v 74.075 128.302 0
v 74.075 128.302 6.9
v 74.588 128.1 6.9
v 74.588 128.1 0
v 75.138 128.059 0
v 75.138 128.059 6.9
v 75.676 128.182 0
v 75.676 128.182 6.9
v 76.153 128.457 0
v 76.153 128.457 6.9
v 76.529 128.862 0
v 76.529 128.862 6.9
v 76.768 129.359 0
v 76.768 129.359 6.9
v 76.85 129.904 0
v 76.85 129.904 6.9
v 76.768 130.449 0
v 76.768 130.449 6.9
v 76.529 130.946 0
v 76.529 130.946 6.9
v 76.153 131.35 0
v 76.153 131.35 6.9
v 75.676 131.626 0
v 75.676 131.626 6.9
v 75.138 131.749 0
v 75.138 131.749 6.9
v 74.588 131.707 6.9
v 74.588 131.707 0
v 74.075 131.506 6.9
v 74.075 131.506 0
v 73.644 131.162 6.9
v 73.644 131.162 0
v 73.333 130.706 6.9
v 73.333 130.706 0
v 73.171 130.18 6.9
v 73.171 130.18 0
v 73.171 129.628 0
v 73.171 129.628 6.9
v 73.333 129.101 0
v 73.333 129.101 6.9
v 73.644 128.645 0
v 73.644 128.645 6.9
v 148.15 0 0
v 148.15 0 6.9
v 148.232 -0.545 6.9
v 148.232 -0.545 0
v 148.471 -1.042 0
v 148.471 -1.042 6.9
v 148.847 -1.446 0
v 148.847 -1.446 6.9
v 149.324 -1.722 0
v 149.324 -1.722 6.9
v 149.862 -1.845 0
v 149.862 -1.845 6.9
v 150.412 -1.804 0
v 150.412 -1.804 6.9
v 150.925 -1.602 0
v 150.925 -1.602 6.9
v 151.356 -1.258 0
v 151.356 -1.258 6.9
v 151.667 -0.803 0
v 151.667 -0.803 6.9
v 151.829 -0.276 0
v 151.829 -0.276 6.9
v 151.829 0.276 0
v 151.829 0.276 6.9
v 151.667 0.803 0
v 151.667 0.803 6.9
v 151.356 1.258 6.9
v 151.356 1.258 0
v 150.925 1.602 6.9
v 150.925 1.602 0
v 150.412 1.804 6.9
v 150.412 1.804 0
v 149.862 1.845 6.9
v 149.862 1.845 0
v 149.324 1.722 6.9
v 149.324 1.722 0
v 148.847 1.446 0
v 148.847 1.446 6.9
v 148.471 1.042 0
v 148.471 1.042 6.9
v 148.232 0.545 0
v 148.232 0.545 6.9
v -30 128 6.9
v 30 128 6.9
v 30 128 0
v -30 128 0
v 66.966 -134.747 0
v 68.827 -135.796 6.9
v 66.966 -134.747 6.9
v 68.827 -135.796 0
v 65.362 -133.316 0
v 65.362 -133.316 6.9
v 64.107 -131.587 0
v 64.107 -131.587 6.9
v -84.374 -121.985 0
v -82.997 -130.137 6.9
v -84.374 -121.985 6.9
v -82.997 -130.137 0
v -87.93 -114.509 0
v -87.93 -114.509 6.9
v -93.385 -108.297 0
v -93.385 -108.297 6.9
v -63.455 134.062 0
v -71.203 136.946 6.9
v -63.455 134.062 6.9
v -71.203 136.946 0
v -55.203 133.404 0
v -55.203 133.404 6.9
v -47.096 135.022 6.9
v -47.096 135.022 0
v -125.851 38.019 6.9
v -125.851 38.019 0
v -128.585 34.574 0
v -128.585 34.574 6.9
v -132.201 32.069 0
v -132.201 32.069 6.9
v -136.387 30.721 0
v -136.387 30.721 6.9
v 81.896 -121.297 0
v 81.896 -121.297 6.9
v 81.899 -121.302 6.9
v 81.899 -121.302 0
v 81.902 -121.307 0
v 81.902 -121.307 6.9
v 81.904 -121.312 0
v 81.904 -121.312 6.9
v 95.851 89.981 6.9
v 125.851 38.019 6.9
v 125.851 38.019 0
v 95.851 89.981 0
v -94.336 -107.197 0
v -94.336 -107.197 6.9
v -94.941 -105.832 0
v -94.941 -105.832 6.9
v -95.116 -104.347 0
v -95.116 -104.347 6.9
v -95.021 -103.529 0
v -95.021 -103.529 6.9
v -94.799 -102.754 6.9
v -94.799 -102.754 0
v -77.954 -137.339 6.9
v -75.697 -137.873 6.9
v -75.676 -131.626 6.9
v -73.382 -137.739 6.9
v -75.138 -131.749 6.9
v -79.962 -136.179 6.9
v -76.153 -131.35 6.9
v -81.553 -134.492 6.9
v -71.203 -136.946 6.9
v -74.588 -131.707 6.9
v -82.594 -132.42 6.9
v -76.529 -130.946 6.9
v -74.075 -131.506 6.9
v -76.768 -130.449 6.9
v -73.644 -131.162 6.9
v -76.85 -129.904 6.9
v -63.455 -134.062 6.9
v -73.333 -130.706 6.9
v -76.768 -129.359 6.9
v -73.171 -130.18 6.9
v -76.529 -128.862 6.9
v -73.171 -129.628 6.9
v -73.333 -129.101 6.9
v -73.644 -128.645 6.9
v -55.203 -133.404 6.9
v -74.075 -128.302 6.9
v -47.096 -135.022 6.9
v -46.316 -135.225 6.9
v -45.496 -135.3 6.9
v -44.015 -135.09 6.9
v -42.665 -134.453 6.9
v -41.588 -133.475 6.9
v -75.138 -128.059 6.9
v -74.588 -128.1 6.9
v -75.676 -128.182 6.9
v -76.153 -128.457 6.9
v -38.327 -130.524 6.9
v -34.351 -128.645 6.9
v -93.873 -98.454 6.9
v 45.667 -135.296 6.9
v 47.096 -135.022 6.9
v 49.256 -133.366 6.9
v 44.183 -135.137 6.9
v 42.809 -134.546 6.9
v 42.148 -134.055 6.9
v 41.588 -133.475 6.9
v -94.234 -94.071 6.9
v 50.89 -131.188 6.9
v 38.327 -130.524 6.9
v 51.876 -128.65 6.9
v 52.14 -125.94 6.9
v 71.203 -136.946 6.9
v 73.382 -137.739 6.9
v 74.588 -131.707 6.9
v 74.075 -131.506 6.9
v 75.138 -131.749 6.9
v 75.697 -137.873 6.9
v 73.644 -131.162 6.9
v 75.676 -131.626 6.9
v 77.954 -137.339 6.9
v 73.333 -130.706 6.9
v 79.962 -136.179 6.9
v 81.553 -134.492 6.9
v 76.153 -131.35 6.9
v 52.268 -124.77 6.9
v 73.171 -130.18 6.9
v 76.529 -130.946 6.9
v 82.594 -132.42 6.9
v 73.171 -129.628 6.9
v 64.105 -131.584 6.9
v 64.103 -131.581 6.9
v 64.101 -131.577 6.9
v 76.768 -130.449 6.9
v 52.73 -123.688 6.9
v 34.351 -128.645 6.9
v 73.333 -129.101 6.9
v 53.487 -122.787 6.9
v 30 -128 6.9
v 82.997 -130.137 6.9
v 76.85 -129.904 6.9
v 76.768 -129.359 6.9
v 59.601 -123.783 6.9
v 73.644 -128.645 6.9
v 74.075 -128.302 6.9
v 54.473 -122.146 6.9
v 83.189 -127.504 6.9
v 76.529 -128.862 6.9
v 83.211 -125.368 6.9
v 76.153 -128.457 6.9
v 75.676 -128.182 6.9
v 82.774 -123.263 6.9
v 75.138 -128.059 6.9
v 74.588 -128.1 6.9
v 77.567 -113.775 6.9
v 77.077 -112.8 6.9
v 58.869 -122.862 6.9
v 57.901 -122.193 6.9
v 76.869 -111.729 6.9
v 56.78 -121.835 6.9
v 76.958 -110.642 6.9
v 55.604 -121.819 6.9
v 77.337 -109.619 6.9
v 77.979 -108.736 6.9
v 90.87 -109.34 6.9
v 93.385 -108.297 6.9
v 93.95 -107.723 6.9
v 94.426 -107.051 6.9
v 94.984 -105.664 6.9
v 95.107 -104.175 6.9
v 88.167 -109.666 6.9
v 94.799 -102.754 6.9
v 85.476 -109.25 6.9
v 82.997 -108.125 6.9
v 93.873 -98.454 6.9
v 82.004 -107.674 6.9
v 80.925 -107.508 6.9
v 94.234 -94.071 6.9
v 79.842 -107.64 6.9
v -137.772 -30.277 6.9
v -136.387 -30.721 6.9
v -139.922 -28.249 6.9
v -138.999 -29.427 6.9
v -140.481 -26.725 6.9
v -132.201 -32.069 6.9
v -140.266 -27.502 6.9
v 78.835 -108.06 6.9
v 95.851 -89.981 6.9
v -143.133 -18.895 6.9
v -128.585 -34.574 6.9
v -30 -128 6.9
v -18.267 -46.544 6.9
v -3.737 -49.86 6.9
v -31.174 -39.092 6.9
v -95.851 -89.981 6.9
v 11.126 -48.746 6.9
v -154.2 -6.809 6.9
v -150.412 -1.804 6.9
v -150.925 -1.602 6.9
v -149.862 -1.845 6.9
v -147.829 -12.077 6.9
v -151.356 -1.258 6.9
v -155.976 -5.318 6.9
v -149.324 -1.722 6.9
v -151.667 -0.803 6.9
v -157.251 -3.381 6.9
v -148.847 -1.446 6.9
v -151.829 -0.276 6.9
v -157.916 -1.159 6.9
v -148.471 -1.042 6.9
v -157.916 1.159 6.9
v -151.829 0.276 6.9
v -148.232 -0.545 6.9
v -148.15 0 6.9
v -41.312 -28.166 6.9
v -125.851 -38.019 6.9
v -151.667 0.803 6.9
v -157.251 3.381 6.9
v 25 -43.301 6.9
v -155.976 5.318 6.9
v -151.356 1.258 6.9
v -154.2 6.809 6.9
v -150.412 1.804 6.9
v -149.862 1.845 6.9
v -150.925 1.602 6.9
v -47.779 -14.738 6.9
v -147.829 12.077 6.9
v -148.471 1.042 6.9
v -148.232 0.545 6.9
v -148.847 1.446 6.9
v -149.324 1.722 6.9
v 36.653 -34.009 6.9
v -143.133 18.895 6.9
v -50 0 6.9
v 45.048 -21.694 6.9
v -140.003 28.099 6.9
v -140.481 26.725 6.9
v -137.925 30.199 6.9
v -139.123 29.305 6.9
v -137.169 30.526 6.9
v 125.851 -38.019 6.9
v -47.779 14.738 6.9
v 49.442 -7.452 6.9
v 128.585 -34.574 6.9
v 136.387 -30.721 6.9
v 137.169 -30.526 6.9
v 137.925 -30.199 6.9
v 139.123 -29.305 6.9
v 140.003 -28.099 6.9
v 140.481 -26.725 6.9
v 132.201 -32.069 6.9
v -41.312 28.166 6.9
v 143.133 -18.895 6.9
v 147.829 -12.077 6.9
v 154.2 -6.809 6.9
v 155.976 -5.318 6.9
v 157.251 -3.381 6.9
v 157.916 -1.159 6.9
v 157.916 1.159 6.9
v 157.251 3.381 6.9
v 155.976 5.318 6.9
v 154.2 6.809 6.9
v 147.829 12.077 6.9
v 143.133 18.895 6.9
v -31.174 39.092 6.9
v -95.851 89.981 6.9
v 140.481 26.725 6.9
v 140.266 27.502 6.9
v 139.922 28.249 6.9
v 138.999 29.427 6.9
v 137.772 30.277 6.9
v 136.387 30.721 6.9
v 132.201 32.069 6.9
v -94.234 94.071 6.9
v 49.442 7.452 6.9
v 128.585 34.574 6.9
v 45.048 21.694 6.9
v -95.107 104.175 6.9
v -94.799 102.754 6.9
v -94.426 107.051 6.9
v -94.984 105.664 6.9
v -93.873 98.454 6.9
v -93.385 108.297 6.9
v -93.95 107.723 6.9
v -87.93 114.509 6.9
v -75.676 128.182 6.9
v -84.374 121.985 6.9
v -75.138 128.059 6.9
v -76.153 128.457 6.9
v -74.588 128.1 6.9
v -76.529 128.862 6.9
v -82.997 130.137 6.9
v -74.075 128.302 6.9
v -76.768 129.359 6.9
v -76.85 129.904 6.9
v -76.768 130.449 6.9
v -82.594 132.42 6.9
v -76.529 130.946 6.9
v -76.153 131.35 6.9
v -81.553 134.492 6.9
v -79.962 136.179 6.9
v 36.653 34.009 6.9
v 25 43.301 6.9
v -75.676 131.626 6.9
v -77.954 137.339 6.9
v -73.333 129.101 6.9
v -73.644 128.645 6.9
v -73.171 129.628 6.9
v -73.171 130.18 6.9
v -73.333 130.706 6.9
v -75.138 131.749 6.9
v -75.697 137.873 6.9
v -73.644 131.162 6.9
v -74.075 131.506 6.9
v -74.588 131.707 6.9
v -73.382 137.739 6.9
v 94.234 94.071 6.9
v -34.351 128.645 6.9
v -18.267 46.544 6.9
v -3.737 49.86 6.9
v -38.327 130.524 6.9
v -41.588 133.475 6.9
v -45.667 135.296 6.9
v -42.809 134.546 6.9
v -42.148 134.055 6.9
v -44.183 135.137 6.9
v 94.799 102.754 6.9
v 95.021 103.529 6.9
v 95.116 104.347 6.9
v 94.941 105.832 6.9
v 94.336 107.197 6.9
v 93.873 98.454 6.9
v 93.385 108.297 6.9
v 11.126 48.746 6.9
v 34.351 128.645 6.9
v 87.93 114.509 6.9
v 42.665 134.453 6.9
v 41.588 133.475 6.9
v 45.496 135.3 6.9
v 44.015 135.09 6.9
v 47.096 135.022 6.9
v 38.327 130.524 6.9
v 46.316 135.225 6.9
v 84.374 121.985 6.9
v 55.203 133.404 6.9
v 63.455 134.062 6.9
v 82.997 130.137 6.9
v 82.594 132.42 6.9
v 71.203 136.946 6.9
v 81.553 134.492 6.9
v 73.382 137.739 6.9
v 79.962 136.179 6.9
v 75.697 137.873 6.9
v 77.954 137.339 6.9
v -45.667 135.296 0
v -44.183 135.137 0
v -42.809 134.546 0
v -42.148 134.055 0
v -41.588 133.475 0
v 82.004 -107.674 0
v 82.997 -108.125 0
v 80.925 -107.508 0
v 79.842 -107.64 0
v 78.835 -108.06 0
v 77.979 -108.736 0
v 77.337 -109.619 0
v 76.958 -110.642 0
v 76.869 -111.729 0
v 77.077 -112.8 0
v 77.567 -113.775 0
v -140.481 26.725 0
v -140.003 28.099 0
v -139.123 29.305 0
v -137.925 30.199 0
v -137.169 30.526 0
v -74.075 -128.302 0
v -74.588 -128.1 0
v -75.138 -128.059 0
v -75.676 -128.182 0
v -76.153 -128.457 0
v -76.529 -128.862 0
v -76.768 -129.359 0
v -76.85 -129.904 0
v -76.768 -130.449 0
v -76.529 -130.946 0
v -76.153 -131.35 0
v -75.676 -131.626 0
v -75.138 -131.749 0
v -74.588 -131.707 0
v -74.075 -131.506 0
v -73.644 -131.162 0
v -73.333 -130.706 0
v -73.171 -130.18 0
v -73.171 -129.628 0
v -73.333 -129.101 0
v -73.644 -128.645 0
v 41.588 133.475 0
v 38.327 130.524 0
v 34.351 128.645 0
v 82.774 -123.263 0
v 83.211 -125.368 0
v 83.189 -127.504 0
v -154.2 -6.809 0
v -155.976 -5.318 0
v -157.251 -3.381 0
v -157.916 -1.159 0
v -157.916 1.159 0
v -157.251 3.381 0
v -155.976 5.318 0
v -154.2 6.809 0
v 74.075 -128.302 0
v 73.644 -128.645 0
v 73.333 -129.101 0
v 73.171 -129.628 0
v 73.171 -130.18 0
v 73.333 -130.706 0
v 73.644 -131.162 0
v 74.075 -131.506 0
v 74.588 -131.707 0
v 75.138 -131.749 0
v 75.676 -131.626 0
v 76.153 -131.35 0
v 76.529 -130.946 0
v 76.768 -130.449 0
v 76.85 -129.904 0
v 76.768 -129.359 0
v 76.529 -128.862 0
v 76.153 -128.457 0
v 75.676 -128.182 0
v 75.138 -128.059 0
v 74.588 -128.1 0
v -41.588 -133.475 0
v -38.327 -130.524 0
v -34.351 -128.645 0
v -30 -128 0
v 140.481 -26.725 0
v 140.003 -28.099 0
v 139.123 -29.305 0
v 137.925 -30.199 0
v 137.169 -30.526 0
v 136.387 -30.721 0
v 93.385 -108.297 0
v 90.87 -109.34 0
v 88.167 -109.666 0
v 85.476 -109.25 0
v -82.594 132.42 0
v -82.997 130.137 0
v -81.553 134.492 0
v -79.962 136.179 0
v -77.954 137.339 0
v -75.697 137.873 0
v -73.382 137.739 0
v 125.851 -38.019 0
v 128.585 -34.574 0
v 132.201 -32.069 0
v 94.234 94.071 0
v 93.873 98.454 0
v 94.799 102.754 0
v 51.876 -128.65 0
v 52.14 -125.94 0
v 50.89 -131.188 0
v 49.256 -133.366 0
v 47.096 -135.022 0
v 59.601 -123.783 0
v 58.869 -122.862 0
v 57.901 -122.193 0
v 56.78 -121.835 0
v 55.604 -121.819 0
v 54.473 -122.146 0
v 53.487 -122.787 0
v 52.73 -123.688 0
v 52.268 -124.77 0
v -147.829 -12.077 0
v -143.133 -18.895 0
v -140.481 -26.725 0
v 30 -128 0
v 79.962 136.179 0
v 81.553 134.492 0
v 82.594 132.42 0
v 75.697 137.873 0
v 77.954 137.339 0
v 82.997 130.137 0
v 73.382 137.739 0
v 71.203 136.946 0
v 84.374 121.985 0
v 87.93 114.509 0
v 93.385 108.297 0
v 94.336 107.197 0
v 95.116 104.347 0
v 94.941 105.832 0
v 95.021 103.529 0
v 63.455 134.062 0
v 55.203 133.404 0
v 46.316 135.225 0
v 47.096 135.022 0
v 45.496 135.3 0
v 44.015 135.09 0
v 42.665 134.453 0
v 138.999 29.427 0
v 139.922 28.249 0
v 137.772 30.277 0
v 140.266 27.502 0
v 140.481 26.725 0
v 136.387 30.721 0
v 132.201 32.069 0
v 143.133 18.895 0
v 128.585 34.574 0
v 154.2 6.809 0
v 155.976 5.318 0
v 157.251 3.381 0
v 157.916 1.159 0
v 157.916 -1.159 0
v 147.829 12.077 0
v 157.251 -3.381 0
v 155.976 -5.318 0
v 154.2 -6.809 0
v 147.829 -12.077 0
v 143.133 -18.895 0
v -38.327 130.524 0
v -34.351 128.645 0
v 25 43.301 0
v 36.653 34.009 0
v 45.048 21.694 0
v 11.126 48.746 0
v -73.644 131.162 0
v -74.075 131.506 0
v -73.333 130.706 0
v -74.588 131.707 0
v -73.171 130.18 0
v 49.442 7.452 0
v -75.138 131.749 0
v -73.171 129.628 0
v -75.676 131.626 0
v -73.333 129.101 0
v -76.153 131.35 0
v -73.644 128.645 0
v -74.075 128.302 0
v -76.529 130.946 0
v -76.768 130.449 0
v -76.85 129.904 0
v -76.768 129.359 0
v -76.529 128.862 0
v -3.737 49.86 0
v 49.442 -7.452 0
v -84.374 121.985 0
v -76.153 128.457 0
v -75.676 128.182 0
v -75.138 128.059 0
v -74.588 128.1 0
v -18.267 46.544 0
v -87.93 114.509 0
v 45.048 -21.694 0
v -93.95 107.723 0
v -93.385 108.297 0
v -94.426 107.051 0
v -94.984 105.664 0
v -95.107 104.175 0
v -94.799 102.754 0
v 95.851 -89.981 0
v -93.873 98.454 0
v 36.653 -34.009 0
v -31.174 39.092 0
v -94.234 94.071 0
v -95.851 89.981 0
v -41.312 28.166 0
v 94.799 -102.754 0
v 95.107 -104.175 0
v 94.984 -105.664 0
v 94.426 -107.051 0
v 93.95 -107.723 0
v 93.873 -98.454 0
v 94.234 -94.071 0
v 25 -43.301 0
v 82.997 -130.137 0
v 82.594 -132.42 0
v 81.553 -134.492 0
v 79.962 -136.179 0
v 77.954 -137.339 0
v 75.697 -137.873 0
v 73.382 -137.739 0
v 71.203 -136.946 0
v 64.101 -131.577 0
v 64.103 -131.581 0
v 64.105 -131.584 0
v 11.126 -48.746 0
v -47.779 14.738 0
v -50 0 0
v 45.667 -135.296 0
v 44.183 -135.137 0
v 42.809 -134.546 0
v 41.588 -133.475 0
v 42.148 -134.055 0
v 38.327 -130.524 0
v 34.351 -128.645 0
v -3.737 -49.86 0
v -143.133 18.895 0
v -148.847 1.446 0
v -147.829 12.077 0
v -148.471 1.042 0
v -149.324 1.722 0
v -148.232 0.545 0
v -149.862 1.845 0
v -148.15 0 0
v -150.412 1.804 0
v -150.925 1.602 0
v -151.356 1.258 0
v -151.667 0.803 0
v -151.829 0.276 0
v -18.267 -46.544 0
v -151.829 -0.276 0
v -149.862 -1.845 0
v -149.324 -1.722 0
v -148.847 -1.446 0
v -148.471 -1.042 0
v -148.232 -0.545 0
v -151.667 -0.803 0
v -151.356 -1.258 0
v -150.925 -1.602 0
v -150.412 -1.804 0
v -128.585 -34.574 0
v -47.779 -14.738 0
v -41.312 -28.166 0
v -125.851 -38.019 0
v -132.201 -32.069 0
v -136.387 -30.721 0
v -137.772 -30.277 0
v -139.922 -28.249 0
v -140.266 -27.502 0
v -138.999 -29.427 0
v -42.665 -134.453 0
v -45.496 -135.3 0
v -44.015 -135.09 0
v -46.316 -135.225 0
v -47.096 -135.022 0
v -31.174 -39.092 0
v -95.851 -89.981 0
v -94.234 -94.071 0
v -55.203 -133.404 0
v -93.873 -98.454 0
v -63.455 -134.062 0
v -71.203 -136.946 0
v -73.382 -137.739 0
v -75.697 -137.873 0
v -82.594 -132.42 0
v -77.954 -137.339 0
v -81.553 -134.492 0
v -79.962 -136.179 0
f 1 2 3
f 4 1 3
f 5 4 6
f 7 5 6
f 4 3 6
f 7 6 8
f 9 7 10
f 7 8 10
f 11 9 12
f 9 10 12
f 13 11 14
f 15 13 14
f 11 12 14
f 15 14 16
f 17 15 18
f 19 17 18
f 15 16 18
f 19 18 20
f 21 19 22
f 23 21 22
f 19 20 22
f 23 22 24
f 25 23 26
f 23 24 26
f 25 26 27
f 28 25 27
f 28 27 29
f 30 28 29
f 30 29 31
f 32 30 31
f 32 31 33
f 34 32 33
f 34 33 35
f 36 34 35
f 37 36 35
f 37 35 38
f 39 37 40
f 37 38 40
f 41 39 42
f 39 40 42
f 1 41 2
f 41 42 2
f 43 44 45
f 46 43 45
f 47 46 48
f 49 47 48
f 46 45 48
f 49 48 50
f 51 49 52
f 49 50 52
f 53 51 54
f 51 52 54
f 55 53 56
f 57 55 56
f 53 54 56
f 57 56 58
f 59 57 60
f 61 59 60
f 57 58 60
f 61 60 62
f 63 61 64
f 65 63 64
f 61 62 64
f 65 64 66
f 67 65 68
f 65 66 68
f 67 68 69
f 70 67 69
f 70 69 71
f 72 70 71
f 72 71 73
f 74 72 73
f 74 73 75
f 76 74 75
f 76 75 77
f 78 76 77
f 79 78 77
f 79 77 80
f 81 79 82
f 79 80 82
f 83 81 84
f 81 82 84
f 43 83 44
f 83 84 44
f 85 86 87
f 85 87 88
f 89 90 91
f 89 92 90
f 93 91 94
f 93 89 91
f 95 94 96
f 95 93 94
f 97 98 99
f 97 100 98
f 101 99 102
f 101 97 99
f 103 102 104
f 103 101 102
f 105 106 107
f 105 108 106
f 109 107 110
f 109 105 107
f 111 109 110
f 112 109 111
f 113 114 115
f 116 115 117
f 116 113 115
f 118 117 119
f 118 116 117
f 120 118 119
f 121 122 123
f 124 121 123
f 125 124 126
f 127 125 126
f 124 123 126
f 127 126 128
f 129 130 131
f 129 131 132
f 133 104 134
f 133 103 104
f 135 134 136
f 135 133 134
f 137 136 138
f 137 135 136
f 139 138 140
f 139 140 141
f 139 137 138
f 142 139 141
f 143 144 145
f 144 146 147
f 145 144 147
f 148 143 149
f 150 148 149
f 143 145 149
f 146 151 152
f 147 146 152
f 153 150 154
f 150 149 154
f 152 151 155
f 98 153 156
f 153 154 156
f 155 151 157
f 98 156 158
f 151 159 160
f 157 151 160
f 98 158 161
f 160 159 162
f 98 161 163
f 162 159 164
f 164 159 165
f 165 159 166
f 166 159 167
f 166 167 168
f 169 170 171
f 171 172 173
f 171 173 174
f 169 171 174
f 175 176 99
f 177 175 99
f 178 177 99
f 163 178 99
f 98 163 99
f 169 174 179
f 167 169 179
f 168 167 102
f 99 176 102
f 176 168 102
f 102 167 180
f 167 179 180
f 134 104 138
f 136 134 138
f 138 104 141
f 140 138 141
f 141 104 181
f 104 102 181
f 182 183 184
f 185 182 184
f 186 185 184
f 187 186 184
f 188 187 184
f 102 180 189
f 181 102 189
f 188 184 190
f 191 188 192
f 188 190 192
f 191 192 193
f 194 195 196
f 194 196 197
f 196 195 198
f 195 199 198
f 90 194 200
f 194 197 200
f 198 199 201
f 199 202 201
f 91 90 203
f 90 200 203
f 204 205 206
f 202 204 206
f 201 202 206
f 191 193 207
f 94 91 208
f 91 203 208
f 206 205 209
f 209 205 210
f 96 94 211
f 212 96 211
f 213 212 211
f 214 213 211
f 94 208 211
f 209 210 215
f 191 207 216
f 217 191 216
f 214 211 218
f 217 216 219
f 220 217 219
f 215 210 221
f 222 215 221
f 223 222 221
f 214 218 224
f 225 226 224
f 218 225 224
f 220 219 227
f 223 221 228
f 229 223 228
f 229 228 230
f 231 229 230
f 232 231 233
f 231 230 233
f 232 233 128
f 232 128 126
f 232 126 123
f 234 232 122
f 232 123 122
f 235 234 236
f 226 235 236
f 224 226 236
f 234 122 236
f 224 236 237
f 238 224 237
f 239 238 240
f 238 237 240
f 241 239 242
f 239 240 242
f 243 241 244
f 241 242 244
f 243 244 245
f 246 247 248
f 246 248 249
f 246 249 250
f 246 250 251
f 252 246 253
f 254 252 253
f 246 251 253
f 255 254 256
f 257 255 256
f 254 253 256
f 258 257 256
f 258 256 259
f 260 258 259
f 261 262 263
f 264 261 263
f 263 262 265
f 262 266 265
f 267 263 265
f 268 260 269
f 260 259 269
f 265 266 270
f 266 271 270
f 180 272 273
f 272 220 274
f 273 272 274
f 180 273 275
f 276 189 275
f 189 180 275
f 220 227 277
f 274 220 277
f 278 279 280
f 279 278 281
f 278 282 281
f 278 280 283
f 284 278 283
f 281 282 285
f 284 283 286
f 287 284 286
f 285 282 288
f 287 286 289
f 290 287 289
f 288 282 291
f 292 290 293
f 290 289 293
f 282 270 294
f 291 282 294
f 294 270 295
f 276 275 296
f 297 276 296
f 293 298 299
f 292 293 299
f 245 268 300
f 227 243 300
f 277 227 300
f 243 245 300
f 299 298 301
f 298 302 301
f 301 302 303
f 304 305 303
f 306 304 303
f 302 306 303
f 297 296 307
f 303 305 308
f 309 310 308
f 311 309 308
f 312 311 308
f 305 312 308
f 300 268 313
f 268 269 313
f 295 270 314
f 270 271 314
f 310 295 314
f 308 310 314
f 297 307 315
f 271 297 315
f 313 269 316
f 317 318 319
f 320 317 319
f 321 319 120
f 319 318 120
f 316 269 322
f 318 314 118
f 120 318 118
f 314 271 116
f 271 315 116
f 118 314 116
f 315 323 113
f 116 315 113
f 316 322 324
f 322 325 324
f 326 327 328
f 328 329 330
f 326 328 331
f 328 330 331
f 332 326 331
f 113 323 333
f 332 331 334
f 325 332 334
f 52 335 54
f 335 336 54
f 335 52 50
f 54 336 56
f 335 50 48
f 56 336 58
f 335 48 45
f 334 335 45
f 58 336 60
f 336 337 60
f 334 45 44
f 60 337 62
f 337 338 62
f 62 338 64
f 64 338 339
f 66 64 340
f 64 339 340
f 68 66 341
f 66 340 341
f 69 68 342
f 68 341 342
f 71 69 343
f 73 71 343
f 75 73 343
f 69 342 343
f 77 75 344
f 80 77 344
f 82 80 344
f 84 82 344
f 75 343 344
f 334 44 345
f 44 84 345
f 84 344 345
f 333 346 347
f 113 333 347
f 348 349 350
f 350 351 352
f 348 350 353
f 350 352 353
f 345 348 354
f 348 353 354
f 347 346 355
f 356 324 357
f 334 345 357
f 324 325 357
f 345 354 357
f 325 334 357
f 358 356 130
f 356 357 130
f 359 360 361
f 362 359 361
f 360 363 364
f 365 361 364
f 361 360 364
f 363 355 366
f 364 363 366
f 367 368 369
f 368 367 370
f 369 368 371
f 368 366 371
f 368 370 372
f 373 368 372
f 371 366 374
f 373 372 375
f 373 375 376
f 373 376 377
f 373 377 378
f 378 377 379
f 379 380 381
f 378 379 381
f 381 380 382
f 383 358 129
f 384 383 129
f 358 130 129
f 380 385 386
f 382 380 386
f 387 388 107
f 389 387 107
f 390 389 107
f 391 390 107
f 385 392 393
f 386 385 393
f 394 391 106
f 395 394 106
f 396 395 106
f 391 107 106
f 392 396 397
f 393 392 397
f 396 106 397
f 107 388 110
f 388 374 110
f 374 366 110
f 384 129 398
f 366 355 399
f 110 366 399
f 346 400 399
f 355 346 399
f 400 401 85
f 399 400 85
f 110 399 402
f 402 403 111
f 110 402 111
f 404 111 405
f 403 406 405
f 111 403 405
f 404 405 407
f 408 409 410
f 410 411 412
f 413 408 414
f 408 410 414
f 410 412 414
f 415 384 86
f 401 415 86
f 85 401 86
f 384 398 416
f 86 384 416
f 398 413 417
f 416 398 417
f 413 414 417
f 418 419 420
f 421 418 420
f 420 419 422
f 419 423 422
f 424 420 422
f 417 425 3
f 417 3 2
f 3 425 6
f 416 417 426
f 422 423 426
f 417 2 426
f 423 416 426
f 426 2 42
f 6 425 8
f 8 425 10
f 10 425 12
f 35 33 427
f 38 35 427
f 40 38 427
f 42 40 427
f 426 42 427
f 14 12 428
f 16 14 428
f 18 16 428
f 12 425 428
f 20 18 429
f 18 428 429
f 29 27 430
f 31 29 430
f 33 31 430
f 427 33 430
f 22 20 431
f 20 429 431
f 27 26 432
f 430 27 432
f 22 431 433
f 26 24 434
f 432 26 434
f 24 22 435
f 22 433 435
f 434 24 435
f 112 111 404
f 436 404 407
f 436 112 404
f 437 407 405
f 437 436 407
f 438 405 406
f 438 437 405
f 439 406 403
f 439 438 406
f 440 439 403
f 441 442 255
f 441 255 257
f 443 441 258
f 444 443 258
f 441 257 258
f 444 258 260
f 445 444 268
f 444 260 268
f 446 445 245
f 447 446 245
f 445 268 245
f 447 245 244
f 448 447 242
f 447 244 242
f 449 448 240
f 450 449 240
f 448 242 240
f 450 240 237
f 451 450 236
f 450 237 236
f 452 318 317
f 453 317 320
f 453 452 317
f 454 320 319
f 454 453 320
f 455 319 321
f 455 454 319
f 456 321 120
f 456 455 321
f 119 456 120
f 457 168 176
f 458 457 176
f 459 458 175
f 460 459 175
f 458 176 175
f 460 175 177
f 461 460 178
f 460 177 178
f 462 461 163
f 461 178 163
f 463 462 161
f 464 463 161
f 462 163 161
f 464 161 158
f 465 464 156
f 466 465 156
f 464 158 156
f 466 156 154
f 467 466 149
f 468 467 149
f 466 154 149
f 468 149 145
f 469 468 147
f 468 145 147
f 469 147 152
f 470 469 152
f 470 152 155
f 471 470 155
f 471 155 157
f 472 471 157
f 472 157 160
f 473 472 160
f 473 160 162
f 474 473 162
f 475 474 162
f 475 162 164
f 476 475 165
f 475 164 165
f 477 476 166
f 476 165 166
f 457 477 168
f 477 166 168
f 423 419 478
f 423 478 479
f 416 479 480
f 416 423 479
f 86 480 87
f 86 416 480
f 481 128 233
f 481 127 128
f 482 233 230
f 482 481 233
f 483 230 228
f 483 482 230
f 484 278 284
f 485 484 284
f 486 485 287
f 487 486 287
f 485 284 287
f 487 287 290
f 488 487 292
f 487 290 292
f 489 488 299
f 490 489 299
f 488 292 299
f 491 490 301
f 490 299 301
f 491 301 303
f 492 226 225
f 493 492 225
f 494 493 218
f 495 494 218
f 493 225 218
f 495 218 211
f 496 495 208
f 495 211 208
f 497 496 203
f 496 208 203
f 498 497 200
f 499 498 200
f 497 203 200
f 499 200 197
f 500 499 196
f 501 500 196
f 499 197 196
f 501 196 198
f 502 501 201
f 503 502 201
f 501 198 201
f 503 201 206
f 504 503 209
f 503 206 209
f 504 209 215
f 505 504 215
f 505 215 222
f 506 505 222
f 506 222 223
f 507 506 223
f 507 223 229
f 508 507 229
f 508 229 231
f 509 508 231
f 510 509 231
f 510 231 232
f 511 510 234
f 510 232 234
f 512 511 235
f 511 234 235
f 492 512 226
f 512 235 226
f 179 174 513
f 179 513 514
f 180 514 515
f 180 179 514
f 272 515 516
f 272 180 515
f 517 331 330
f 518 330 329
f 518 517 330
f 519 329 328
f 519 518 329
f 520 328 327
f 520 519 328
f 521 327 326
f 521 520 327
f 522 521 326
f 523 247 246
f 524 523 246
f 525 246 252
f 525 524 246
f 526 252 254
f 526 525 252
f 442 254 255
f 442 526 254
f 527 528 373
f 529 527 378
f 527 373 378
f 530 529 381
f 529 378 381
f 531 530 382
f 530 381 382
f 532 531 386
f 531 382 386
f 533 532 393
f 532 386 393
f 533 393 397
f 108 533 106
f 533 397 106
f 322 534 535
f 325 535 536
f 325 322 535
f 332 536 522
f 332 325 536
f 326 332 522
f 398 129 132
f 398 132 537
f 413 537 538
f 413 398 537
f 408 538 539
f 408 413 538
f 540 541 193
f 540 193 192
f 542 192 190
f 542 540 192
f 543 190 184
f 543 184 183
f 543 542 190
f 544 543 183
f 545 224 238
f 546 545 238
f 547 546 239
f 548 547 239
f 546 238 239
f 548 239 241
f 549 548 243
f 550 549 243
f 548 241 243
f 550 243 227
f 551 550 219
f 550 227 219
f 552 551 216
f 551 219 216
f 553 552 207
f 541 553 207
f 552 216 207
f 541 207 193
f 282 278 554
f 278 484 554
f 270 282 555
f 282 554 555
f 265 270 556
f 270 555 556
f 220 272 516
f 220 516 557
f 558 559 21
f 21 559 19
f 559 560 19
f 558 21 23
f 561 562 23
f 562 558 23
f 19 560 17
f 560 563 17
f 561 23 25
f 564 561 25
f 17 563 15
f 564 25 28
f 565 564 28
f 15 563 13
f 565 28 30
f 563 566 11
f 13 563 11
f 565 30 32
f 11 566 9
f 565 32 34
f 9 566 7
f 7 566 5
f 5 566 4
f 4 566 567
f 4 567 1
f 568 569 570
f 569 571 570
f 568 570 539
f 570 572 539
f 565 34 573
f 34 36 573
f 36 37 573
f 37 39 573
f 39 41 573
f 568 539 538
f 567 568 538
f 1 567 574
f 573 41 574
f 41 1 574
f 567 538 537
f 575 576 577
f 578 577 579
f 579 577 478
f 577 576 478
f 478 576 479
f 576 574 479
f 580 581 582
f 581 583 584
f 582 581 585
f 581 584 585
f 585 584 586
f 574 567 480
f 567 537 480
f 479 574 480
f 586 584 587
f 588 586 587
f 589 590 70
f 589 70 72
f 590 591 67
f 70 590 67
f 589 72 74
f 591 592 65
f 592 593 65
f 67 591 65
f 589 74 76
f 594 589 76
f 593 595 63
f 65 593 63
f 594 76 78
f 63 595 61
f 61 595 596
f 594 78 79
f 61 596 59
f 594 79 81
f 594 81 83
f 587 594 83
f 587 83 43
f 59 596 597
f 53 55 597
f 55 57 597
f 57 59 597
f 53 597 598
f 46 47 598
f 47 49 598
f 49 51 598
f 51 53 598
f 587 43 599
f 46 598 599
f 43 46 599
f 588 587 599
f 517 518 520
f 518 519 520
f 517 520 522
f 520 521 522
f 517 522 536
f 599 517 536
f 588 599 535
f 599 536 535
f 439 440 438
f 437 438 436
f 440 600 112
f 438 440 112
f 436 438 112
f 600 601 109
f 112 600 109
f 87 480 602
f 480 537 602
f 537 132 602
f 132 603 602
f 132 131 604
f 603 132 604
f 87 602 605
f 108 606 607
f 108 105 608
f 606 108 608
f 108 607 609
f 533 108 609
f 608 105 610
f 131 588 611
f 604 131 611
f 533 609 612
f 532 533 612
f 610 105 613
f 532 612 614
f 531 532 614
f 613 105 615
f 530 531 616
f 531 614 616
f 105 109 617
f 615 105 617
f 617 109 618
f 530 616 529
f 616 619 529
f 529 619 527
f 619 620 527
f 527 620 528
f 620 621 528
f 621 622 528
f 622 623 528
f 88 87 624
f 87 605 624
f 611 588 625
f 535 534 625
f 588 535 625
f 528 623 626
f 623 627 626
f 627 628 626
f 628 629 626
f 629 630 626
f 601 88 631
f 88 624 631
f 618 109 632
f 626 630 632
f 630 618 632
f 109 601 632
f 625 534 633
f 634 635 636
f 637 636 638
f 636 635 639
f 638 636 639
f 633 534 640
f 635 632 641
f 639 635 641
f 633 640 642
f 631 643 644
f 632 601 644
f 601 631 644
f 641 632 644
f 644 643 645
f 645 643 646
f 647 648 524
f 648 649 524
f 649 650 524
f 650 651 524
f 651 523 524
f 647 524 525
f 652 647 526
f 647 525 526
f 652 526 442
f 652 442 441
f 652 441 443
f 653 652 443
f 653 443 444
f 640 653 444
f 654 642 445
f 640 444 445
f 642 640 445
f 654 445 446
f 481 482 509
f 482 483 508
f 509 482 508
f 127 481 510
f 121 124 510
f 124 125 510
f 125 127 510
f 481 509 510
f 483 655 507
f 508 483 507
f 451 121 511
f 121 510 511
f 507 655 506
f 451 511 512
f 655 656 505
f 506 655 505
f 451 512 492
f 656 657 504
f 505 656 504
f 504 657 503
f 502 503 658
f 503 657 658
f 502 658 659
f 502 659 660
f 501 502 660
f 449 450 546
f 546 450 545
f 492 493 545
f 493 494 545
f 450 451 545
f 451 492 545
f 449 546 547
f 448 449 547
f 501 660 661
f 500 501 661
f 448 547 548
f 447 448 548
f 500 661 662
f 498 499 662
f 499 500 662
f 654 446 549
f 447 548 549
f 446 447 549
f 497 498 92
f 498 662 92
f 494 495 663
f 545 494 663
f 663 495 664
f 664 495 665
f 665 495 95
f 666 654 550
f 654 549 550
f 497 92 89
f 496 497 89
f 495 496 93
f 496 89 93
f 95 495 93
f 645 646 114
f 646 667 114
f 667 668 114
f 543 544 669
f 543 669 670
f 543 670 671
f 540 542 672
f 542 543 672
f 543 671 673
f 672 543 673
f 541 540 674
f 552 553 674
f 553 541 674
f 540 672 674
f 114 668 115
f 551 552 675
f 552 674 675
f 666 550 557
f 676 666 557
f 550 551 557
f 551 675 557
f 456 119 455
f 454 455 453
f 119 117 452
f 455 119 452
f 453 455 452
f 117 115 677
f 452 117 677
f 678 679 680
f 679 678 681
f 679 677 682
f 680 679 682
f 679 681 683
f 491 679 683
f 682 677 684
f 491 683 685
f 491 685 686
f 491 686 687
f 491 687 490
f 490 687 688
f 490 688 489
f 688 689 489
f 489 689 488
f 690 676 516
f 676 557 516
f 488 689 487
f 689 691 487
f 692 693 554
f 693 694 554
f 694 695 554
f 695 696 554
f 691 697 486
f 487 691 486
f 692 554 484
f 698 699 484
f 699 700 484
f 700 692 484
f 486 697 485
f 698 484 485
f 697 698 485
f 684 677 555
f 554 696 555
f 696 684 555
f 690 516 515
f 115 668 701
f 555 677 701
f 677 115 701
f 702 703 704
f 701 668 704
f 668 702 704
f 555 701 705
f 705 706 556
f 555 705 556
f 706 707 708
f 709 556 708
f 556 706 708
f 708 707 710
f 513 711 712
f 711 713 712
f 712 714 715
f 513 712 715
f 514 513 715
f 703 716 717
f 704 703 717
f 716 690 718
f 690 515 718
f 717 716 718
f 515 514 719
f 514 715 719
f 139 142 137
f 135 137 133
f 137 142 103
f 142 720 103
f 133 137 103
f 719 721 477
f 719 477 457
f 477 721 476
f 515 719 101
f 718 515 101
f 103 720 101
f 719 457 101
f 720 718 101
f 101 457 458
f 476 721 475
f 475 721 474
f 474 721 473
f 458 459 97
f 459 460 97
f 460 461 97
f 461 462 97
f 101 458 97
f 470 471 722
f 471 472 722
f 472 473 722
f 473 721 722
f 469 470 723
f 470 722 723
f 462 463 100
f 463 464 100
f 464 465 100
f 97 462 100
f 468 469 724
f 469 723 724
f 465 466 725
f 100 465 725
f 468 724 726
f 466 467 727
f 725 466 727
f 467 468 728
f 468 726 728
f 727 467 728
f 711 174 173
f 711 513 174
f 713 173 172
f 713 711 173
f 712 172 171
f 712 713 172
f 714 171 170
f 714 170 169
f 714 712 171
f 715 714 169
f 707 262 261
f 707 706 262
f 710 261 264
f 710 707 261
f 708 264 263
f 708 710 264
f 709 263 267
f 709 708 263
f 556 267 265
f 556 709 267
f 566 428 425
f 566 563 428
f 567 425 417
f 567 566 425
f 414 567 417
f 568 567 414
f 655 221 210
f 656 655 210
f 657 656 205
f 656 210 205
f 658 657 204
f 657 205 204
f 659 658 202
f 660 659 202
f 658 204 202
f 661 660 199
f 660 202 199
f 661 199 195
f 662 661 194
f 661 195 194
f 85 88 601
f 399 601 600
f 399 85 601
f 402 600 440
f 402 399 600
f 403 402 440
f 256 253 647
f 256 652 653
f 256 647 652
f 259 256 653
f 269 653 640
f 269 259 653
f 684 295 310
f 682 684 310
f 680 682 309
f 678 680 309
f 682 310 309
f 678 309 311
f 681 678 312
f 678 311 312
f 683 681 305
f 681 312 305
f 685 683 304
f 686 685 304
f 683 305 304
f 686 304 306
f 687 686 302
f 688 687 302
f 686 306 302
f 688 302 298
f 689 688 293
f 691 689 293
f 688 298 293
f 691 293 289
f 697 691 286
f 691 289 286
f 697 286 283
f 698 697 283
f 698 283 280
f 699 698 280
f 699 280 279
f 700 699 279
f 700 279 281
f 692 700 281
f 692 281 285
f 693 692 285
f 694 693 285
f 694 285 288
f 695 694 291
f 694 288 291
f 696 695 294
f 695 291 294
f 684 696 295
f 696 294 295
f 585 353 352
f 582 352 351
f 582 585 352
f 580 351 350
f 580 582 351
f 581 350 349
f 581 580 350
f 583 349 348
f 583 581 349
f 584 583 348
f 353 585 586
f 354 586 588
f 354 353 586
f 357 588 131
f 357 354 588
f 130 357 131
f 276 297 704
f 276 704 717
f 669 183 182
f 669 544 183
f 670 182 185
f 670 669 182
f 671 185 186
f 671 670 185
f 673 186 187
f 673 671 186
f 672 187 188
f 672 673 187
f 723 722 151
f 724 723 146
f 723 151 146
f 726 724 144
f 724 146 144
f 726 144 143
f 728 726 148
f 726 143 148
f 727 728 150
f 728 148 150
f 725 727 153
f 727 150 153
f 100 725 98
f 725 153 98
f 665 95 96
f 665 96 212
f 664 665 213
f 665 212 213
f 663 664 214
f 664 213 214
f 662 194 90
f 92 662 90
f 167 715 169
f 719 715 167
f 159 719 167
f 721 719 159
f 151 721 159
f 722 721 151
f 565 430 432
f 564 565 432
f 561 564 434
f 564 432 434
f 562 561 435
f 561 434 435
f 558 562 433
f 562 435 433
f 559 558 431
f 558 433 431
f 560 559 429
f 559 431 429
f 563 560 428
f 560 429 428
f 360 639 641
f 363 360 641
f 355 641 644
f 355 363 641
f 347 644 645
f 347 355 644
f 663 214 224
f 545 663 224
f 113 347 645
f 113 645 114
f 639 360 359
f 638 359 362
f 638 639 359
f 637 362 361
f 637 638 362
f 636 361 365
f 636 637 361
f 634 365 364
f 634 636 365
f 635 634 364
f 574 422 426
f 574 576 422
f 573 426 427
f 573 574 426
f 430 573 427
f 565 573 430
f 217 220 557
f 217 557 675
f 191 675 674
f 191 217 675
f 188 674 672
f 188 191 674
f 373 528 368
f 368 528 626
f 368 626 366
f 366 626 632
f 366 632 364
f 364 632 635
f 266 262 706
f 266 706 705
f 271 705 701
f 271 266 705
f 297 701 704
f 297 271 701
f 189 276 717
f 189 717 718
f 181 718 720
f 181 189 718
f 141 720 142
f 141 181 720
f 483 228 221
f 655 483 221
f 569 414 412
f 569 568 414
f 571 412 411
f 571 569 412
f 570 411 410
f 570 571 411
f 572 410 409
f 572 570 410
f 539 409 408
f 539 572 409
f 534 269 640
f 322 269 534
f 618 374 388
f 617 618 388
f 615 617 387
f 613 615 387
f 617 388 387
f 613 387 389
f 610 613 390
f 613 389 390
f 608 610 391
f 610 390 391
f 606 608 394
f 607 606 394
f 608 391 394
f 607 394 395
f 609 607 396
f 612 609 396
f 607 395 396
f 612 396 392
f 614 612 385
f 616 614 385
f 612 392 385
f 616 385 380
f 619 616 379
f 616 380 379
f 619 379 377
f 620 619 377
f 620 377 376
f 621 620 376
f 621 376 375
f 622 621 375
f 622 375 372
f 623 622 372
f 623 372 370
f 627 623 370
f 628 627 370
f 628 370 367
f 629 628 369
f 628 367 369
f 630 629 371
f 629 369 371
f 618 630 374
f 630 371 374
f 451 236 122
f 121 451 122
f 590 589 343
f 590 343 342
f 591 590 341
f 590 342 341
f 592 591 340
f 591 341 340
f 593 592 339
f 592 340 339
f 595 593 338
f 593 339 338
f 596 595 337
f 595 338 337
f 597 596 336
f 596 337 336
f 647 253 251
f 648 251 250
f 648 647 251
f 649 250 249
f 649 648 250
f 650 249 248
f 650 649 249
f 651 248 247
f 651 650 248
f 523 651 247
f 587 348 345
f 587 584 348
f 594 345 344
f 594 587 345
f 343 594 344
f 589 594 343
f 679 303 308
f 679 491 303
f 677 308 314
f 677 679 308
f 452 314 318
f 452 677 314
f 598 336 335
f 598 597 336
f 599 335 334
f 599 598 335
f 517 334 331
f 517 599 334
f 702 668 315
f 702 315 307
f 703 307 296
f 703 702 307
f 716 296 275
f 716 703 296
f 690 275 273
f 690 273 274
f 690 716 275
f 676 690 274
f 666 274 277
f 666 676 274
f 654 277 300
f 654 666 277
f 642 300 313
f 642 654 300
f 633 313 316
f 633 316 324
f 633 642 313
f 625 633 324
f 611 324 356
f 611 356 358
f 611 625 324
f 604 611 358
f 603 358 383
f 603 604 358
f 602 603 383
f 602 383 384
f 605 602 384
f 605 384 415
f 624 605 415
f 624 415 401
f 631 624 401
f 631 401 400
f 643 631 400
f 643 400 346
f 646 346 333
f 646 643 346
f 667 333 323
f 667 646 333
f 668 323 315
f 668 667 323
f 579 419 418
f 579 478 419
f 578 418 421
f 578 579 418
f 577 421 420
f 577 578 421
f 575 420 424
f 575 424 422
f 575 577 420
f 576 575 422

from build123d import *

# Parameters (mm, degrees)
SKETCH1_R                = 143
SKETCH1_R_2              = 50
BOSS_EXTRUDE1_DEPTH      = 6.9
SKETCH2_R                = 1.85
BOSS_EXTRUDE2_DEPTH      = 6.9
FILLET1_R                = 30
CIRPATTERN1_COUNT        = 6
FILLET1_OF_CIRPATTERN1_R = 30
CUT_EXTRUDE1_DEPTH       = 214.214938645
FILLET3_R                = 5
CIRPATTERN2_COUNT        = 6
FILLET3_OF_CIRPATTERN2_R = 5
CUT_EXTRUDE2_DEPTH       = 10
FILLET4_R                = 10
FILLET5_START            = -1
FILLET5_DEPTH            = 9


with BuildPart() as part:
    # Sketch1 → Boss-Extrude1 (new body)
    with BuildSketch(Plane.XY):
        with Locations(Location((0, 0, 0), (0, 0, 180))):
            Circle(SKETCH1_R)
        with Locations(Location((0, 0, 0), (0, 0, 180))):
            Circle(SKETCH1_R_2, mode=Mode.SUBTRACT)
    extrude(amount=BOSS_EXTRUDE1_DEPTH)

    # Sketch2 → Boss-Extrude2 (add)
    with BuildSketch(Plane.XY.offset(6.9)):
        with BuildLine():
            Line((-136, -8), (-150, -8))
            ThreePointArc((-150, -8), (-158, 0), (-150, 8))
            Line((-150, 8), (-136, 8))
            ThreePointArc((-136, 8), (-128, 0), (-136, -8))
        make_face()
        with Locations((-150, 0)):
            Circle(SKETCH2_R, mode=Mode.SUBTRACT)
    boss_extrude2 = extrude(amount=-BOSS_EXTRUDE2_DEPTH)

    # Fillet1
    fillet1_edges = [part.edges().sort_by_distance(p)[0] for p in [
        (-142.776048411, 8, 3.45),
        (-142.776048411, -8, 3.45),
    ]]
    fillet(fillet1_edges, radius=FILLET1_R)

    # CirPattern1: Boss-Extrude2 ×6 about axis
    cirpattern1_axis = Axis((0, 0, 0), (0, 0, 1))
    for i in range(1, CIRPATTERN1_COUNT):
        add(boss_extrude2.rotate(cirpattern1_axis, i * 360 / CIRPATTERN1_COUNT))

    # Fillet1 of CirPattern1
    fillet1_of_cirpattern1_edges = [part.edges().sort_by_distance(p)[0] for p in [
        (-78.316227436, -119.647684976, 3.45),
        (-64.459820975, -127.647684976, 3.45),
        (64.459820975, -127.647684976, 3.45),
        (78.316227436, -119.647684976, 3.45),
        (142.776048411, -8, 3.45),
        (142.776048411, 8, 3.45),
        (78.316227436, 119.647684976, 3.45),
        (64.459820975, 127.647684976, 3.45),
        (-64.459820975, 127.647684976, 3.45),
        (-78.316227436, 119.647684976, 3.45),
    ]]
    fillet(fillet1_of_cirpattern1_edges, radius=FILLET1_OF_CIRPATTERN1_R)

    # Sketch7 → Cut-Extrude1 (cut, through all)
    with BuildSketch(Plane.XY.offset(6.9)):
        with BuildLine():
            Line((-30, 158), (30, 158))
            ThreePointArc((30, 158), (45, 143), (30, 128))
            Line((30, 128), (-30, 128))
            ThreePointArc((-30, 128), (-45, 143), (-30, 158))
        make_face()
    cut_extrude1 = extrude(amount=-CUT_EXTRUDE1_DEPTH, mode=Mode.SUBTRACT)

    # Fillet3
    fillet3_edges = [part.edges().sort_by_distance(p)[0] for p in [
        (43.398254251, 136.255610996, 3.45),
        (-43.398254251, 136.255610996, 3.45),
    ]]
    fillet(fillet3_edges, radius=FILLET3_R)

    # CirPattern2: Cut-Extrude1 ×6 about axis
    cirpattern2_axis = Axis((0, 0, 0), (0, 0, 1))
    for i in range(1, CIRPATTERN2_COUNT):
        add(cut_extrude1.rotate(cirpattern2_axis, i * 360 / CIRPATTERN2_COUNT), mode=Mode.SUBTRACT)

    # Fillet3 of CirPattern2
    fillet3_of_cirpattern2_edges = [part.edges().sort_by_distance(p)[0] for p in [
        (-96.301693406, 105.711796159, 3.45),
        (-139.699947656, 30.543814837, 3.45),
        (-139.699947656, -30.543814837, 3.45),
        (-96.301693406, -105.711796159, 3.45),
        (-43.398254251, -136.255610996, 3.45),
        (43.398254251, -136.255610996, 3.45),
        (96.301693406, -105.711796159, 3.45),
        (139.699947656, -30.543814837, 3.45),
        (139.699947656, 30.543814837, 3.45),
        (96.301693406, 105.711796159, 3.45),
    ]]
    fillet(fillet3_of_cirpattern2_edges, radius=FILLET3_OF_CIRPATTERN2_R)

    # Sketch8 → Cut-Extrude2 (cut)
    with BuildSketch(Plane.XY.offset(6.9)):
        with BuildLine():
            Line((88.826969439, -117.302003887), (84.326969439, -109.507775253))
            ThreePointArc((84.326969439, -109.507775253), (78.727650946, -108.125342861), (77.567379868, -113.774878941))
            Line((77.567379868, -113.774878941), (81.895896581, -121.29702529))
            ThreePointArc((81.895896581, -121.29702529), (87.360379041, -122.76754121), (88.826969439, -117.302003887))
        make_face()
        with BuildLine():
            Line((64.101233792, -131.577414018), (59.601233792, -123.783185384))
            ThreePointArc((59.601233792, -123.783185384), (54.136918717, -122.319207019), (52.673277073, -127.783612295))
            Line((52.673277073, -127.783612295), (57.221343973, -135.658853653))
            ThreePointArc((57.221343973, -135.658853653), (62.677994964, -137.017599926), (64.101233792, -131.577414018))
        make_face()
    extrude(amount=-CUT_EXTRUDE2_DEPTH, mode=Mode.SUBTRACT)

    # Fillet4
    fillet4_edges = [part.edges().sort_by_distance(p)[0] for p in [
        (64.565608345, -134.330457838, 3.45),
        (84.050784817, -123.080685956, 3.45),
    ]]
    fillet(fillet4_edges, radius=FILLET4_R)

    # Fillet5: read off the stored shape, not the designer's step
    # Fillet5 outline → Fillet5 (cut)
    with BuildSketch(Plane.XY.offset(FILLET5_START)):
        with BuildLine():
            ThreePointArc((87.553061033, -115.095529803), (90.213766815, -111.477504252), (93.384762884, -108.297213687))
            ThreePointArc((93.384762884, -108.297213687), (88.166794559, -109.665787745), (82.997135719, -108.124743986))
            ThreePointArc((82.997135719, -108.124743986), (83.746204288, -108.73534476), (84.326969439, -109.507775253))
            Line((84.326969439, -109.507775253), (87.553061033, -115.095529803))
        make_face()
        with BuildLine():
            ThreePointArc((52.14020721, -125.939999968), (50.889960833, -131.187577731), (47.09575677, -135.022183827))
            ThreePointArc((47.09575677, -135.022183827), (51.435909668, -133.866082974), (55.900021902, -133.370907928))
            Line((55.900021902, -133.370907928), (52.673277073, -127.783612295))
            ThreePointArc((52.673277073, -127.783612295), (52.294537166, -126.894249553), (52.14020721, -125.939999968))
        make_face()
    extrude(amount=FILLET5_DEPTH, mode=Mode.SUBTRACT)


solid = part.part
